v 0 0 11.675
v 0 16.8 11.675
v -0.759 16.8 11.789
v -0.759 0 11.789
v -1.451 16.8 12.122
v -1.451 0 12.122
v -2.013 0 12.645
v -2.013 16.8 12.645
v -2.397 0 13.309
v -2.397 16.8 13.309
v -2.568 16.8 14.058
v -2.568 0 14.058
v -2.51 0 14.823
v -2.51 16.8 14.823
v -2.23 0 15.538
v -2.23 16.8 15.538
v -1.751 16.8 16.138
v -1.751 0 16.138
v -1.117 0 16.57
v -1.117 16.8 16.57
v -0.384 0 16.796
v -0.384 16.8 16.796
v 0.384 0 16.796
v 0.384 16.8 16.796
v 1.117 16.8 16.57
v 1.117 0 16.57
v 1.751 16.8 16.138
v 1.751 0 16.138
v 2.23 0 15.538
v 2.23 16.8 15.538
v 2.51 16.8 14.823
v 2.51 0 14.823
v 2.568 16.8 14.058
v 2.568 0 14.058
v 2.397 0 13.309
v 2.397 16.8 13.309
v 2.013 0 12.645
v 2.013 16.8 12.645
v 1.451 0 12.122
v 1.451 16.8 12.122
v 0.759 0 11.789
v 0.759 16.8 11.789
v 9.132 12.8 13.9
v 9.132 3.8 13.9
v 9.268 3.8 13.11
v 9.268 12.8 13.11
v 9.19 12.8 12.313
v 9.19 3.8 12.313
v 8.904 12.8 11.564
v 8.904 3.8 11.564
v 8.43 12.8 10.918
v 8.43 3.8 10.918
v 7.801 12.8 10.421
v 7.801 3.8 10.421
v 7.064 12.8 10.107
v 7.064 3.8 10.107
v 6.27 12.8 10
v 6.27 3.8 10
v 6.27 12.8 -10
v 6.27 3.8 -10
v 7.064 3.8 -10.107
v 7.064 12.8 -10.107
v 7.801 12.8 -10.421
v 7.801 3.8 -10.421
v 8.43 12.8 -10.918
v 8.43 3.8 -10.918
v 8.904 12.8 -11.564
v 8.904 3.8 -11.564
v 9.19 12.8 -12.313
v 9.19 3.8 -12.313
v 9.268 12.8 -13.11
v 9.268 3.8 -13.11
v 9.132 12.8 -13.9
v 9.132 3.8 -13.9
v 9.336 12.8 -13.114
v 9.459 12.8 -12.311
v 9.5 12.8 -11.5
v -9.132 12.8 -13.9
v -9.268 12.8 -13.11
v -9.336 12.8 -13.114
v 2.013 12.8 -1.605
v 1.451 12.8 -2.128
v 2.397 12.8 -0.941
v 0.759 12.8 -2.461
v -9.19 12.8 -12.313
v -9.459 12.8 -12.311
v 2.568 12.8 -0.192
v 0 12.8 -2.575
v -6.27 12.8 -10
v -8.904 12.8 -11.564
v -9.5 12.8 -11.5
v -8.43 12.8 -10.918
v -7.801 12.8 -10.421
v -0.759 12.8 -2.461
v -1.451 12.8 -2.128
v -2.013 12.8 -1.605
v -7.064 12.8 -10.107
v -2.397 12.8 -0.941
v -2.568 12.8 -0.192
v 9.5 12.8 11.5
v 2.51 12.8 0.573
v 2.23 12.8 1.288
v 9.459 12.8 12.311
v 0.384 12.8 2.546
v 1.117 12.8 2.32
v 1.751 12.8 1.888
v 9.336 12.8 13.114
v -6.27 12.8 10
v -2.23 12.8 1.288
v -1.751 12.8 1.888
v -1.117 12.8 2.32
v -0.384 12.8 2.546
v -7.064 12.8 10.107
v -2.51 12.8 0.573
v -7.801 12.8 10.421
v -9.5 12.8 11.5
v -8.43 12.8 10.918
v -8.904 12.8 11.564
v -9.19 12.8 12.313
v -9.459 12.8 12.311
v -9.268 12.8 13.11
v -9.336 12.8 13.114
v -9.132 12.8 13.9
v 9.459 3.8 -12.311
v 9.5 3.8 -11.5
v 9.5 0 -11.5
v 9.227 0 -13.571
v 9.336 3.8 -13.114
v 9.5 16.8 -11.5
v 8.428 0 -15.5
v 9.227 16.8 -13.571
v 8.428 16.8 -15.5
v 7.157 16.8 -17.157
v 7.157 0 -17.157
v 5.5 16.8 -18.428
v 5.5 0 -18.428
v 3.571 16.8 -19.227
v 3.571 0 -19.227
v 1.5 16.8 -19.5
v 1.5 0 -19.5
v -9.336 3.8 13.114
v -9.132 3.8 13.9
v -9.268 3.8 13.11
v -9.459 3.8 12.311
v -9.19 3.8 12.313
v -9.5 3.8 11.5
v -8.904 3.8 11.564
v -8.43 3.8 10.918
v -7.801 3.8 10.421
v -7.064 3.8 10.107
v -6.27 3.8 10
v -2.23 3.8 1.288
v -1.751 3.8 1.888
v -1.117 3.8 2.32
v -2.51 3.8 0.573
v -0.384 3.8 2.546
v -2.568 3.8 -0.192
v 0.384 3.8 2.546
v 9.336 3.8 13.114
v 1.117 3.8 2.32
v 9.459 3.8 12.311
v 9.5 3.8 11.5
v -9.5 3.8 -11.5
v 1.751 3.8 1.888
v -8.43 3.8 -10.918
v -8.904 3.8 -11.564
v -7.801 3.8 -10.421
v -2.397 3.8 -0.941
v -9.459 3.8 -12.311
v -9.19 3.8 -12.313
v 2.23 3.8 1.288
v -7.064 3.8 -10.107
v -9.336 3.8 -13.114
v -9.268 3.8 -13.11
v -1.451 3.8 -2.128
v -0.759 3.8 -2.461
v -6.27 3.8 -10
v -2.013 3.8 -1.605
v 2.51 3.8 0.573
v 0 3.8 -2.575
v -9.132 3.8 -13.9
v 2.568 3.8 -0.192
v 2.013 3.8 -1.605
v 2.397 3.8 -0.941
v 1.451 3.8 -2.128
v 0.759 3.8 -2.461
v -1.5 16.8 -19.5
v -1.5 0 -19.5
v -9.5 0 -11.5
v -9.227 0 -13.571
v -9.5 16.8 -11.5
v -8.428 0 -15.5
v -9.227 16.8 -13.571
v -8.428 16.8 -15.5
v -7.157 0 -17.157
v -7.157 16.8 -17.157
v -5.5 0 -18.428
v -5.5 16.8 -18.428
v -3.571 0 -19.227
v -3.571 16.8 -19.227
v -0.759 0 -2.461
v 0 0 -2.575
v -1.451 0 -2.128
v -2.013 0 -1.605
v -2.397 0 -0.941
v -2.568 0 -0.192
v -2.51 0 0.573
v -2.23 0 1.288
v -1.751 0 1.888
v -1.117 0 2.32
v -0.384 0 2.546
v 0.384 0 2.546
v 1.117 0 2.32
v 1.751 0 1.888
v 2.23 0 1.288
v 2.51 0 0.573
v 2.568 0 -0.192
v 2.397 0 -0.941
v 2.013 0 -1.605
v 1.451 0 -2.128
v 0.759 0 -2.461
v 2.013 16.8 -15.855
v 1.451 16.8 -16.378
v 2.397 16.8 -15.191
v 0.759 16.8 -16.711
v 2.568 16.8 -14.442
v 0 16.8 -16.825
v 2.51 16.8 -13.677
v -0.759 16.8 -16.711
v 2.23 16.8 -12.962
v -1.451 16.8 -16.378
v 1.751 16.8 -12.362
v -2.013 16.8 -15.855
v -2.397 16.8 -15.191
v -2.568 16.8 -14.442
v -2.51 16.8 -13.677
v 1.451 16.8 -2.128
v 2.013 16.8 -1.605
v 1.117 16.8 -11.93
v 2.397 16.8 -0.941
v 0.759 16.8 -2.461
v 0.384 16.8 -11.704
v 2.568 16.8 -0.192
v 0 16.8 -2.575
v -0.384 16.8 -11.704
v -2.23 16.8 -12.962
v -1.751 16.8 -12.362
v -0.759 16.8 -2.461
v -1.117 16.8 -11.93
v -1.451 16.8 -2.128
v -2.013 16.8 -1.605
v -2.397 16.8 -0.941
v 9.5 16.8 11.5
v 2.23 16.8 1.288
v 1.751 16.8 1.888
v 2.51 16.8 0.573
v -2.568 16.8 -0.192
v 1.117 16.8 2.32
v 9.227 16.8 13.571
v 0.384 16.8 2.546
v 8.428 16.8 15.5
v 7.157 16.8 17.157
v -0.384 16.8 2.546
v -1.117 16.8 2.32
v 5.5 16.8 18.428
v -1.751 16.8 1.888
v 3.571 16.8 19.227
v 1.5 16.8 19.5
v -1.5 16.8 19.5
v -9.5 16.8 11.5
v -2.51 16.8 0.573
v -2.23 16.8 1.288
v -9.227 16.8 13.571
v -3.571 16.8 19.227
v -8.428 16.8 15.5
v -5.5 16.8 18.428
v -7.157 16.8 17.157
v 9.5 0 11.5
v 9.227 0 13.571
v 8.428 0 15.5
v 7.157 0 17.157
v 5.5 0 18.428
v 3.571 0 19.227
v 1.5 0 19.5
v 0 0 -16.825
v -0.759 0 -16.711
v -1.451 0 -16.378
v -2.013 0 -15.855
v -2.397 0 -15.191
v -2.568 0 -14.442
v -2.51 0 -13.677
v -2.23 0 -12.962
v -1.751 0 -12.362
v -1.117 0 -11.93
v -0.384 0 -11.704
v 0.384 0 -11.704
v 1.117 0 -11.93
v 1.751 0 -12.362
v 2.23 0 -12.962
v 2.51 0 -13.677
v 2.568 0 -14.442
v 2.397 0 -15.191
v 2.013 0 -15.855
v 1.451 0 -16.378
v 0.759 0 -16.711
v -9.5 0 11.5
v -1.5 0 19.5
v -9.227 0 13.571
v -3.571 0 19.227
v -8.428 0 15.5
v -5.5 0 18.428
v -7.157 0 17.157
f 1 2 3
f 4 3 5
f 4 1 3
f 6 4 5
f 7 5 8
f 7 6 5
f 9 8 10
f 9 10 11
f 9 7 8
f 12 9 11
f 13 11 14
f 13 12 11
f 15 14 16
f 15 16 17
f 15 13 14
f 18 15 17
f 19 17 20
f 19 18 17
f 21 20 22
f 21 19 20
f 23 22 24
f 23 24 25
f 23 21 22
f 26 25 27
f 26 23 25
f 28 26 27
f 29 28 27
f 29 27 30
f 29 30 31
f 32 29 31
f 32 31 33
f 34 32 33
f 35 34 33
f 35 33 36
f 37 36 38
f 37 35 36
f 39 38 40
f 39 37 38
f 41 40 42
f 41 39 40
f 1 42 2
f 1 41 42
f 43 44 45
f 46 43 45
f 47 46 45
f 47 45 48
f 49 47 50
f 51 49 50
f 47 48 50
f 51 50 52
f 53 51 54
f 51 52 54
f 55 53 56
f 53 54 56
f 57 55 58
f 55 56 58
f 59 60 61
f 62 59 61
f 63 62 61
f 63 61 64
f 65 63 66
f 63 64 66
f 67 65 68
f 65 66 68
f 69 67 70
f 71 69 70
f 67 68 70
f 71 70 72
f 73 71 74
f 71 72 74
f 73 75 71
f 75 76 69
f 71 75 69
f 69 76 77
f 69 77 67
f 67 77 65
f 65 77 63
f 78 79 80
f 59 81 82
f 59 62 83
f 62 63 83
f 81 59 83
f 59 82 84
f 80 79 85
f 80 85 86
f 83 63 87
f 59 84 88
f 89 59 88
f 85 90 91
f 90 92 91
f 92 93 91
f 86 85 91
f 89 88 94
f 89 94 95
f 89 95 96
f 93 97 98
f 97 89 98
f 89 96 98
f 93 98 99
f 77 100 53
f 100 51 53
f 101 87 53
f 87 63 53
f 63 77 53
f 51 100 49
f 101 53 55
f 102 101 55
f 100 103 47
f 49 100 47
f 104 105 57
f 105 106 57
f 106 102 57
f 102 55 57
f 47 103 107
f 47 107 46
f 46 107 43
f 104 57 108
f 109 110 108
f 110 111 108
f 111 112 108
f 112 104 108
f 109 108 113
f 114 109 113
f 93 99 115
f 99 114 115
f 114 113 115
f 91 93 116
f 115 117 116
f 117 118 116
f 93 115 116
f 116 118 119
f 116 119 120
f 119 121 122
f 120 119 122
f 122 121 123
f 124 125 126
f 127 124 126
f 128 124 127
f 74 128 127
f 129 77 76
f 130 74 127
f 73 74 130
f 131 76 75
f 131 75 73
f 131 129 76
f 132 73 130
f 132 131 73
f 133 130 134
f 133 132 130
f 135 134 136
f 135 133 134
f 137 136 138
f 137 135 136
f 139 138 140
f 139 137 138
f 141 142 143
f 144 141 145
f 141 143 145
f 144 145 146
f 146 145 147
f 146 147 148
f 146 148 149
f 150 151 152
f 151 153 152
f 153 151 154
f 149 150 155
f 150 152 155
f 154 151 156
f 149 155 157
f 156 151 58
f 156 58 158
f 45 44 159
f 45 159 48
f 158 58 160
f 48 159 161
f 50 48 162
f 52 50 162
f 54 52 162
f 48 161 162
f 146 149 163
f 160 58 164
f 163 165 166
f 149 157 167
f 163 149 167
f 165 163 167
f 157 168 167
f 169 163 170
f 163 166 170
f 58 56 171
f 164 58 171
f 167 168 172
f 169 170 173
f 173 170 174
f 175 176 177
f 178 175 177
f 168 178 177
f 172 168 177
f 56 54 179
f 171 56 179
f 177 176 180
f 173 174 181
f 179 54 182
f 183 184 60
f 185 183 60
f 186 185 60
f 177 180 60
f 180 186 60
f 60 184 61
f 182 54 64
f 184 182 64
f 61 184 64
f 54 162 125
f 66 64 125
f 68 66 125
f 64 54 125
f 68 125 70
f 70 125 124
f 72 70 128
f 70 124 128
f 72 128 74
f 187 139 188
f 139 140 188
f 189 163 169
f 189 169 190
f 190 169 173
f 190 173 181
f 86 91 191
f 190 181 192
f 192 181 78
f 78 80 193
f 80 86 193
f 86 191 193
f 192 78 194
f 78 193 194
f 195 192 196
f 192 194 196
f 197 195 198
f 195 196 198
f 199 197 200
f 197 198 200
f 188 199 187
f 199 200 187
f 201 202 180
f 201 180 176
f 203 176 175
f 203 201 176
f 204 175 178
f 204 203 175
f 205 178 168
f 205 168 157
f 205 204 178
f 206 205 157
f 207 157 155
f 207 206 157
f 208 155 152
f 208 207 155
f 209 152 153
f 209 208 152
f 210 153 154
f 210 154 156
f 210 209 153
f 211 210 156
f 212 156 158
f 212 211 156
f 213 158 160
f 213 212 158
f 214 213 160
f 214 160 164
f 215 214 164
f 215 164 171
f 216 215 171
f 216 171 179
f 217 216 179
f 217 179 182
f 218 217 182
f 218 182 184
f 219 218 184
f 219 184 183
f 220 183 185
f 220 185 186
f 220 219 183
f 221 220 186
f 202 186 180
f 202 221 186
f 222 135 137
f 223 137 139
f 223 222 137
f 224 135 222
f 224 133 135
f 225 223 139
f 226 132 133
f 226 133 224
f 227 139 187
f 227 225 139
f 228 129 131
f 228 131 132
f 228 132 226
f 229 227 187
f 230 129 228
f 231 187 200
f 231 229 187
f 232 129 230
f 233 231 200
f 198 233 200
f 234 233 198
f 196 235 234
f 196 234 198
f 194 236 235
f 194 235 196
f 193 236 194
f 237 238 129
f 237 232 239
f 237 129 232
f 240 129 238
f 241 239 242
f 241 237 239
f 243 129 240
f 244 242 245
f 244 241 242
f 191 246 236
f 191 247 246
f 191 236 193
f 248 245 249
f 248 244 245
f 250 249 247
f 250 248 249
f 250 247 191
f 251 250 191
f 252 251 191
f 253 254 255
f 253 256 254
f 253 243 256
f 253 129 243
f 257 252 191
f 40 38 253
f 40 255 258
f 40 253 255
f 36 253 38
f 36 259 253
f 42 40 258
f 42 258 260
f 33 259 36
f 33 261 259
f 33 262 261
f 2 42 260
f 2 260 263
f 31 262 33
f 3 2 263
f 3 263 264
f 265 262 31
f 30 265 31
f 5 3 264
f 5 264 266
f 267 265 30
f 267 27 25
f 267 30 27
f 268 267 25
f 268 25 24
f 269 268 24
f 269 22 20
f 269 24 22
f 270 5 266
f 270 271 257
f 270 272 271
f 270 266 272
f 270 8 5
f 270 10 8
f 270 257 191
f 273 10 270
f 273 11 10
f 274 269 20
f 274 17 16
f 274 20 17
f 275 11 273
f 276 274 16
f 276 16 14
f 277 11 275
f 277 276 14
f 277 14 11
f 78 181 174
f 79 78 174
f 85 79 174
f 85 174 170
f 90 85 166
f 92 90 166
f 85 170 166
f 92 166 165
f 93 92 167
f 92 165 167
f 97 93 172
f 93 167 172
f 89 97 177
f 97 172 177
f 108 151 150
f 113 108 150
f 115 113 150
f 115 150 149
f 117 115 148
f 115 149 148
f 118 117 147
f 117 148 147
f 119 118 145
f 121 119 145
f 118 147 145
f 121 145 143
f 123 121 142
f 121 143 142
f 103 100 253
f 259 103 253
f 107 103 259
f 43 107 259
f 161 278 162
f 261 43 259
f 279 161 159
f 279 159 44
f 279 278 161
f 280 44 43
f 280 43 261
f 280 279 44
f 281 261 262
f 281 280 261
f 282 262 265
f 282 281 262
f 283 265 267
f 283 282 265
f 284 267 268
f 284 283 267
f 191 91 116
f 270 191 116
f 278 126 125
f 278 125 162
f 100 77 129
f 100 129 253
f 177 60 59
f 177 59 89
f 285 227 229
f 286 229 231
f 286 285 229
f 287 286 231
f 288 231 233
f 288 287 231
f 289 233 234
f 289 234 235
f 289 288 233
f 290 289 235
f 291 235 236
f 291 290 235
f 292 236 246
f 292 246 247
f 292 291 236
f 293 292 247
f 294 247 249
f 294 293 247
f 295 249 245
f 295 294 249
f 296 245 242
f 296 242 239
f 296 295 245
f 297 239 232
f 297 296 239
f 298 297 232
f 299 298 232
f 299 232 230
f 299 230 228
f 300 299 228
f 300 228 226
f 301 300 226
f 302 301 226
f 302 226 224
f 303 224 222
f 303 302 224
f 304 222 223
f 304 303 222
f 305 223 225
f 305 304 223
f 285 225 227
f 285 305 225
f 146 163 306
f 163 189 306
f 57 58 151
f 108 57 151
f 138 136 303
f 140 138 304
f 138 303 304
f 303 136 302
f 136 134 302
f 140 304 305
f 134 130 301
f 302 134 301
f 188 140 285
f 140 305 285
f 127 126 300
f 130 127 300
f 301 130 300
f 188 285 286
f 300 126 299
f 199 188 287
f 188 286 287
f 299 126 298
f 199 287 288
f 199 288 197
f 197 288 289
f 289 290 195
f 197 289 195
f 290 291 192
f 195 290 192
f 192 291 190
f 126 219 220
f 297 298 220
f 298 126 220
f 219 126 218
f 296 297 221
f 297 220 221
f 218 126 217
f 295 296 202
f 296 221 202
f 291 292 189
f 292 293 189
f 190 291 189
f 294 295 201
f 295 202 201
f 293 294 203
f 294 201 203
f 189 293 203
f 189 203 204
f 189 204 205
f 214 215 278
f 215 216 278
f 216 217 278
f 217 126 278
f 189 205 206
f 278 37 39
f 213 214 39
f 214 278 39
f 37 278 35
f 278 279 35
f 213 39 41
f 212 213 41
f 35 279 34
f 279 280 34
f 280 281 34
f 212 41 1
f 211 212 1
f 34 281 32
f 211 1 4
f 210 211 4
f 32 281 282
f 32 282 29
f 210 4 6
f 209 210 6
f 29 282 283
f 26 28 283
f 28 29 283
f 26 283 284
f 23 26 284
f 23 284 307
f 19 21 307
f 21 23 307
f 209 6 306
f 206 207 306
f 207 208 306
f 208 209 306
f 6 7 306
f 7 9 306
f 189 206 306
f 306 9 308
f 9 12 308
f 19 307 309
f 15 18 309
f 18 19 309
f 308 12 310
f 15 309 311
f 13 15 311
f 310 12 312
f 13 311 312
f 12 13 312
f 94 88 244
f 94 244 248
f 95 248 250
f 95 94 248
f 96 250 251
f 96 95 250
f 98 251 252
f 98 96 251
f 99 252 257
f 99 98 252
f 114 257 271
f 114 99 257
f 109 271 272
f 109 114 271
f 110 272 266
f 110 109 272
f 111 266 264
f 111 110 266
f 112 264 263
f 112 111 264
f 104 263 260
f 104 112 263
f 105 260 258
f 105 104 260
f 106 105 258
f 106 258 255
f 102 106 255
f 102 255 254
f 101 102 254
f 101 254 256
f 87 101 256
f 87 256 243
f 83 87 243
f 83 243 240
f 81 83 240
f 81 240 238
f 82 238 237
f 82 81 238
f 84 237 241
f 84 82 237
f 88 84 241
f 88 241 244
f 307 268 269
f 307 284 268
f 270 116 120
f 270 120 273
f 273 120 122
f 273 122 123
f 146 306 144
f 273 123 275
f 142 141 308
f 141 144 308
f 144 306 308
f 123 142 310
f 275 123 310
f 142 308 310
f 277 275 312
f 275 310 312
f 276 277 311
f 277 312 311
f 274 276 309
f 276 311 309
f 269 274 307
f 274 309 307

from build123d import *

# Parameters (mm, degrees)
SKETCH1_W           = 19
SKETCH1_H           = 39
SKETCH1_R           = 2.575
BOSS_EXTRUDE1_DEPTH = 3.8
SKETCH2_W           = 19
SKETCH2_H           = 9.5
SKETCH2_R           = 2.575
BOSS_EXTRUDE2_DEPTH = 9
SKETCH3_W           = 19
SKETCH3_H           = 39
SKETCH3_R           = 2.575
BOSS_EXTRUDE3_DEPTH = 4
FILLET1_R           = 8
FILLET2_R           = 3


with BuildPart() as part:
    # Sketch1 → Boss-Extrude1 (new body)
    with BuildSketch(Plane(origin=(0, 0, 0), x_dir=(-1, 0, 0), z_dir=(0, 1, 0))):
        Rectangle(SKETCH1_W, SKETCH1_H)
        with Locations(Location((0, 0, 0), (0, 0, 270))):
            Circle(SKETCH1_R, mode=Mode.SUBTRACT)
        with Locations(Location((0, 14.25, 0), (0, 0, 270))):
            Circle(SKETCH1_R, mode=Mode.SUBTRACT)
        with Locations(Location((0, -14.25, 0), (0, 0, 270))):
            Circle(SKETCH1_R, mode=Mode.SUBTRACT)
    extrude(amount=BOSS_EXTRUDE1_DEPTH)

    # Sketch2 → Boss-Extrude2 (add)
    # profile 1 of 2: a face of its own
    with BuildSketch(Plane(origin=(0, 3.8, 0), x_dir=(-1, 0, 0), z_dir=(0, 1, 0))):
        with Locations((0, 14.75)):
            Rectangle(SKETCH2_W, SKETCH2_H)
        with Locations(Location((0, 14.25, 0), (0, 0, 270))):
            Circle(SKETCH2_R, mode=Mode.SUBTRACT)
    # profile 2 of 2: a face of its own
    with BuildSketch(Plane(origin=(0, 3.8, 0), x_dir=(-1, 0, 0), z_dir=(0, 1, 0))):
        with Locations((0, -14.75)):
            Rectangle(SKETCH2_W, SKETCH2_H)
        with Locations(Location((0, -14.25, 0), (0, 0, 270))):
            Circle(SKETCH2_R, mode=Mode.SUBTRACT)
    extrude(amount=BOSS_EXTRUDE2_DEPTH)

    # Sketch3 → Boss-Extrude3 (add)
    with BuildSketch(Plane(origin=(0, 12.8, 0), x_dir=(-1, 0, 0), z_dir=(0, 1, 0))):
        Rectangle(SKETCH3_W, SKETCH3_H)
        with Locations(Location((0, 14.25, 0), (0, 0, 270))):
            Circle(SKETCH3_R, mode=Mode.SUBTRACT)
        with Locations(Location((0, 0, 0), (0, 0, 270))):
            Circle(SKETCH3_R, mode=Mode.SUBTRACT)
        with Locations(Location((0, -14.25, 0), (0, 0, 270))):
            Circle(SKETCH3_R, mode=Mode.SUBTRACT)
    extrude(amount=BOSS_EXTRUDE3_DEPTH)

    # Fillet1
    fillet1_edges = [part.edges().sort_by_distance(p)[0] for p in [
        (-9.5, 8.4, -19.5),
        (9.5, 8.4, -19.5),
        (9.5, 8.4, 19.5),
        (-9.5, 8.4, 19.5),
    ]]
    fillet(fillet1_edges, radius=FILLET1_R)

    # Fillet2
    # the kernel refuses this fillet: 3 mm, written as the material it takes off along each edge
    with BuildSketch(Plane(origin=(9.5, 3.8, 10), x_dir=(-0.09406475637410622, 0, 0.9955660809852251), z_dir=(0, 1, 0)), Plane(origin=(-9.5, 3.8, -10), x_dir=(0.09406475637410011, 0, -0.9955660809852258), z_dir=(0, 1, 0))) as fillet2_piece_1:
        with BuildLine():
            CenterArc((3.290556001, -2.933786817), FILLET2_R, 77.939890127, 107.457603124)
            Line((0.303857758, -3.215981087), (0.005187934, -3.244200514))
            Line((0.005187934, -3.244200514), (-0.298669824, -0.028219427))
            Line((-0.298669824, -0.028219427), (-0.028219427, 0.298669824))
            ThreePointArc((-0.028219427, 0.298669824), (1.465129695, 0.439766959), (3.980050628, 0.293378682))
            Line((3.980050628, 0.293378682), (3.917369298, 0))
        make_face()
    extrude(amount=9, mode=Mode.SUBTRACT)
    with BuildSketch(Plane(origin=(-9.5, 3.8, 10), x_dir=(0.09406475637410577, 0, 0.9955660809852253), z_dir=(0, 1, 0)), Plane(origin=(9.5, 3.8, -10), x_dir=(-0.09406475637410053, 0, -0.9955660809852258), z_dir=(0, 1, 0))) as fillet2_piece_2:
        with BuildLine():
            CenterArc((3.290556001, 2.933786817), FILLET2_R, 174.602506749, 107.457603124)
            Line((0.303857758, 3.215981087), (0.005187934, 3.244200514))
            Line((0.005187934, 3.244200514), (-0.298669824, 0.028219427))
            Line((-0.298669824, 0.028219427), (-0.028219427, -0.298669824))
            ThreePointArc((-0.028219427, -0.298669824), (1.465129695, -0.439766959), (3.980050628, -0.293378682))
            Line((3.980050628, -0.293378682), (3.917369298, 0))
        make_face()
    extrude(amount=9, mode=Mode.SUBTRACT)


solid = part.part
